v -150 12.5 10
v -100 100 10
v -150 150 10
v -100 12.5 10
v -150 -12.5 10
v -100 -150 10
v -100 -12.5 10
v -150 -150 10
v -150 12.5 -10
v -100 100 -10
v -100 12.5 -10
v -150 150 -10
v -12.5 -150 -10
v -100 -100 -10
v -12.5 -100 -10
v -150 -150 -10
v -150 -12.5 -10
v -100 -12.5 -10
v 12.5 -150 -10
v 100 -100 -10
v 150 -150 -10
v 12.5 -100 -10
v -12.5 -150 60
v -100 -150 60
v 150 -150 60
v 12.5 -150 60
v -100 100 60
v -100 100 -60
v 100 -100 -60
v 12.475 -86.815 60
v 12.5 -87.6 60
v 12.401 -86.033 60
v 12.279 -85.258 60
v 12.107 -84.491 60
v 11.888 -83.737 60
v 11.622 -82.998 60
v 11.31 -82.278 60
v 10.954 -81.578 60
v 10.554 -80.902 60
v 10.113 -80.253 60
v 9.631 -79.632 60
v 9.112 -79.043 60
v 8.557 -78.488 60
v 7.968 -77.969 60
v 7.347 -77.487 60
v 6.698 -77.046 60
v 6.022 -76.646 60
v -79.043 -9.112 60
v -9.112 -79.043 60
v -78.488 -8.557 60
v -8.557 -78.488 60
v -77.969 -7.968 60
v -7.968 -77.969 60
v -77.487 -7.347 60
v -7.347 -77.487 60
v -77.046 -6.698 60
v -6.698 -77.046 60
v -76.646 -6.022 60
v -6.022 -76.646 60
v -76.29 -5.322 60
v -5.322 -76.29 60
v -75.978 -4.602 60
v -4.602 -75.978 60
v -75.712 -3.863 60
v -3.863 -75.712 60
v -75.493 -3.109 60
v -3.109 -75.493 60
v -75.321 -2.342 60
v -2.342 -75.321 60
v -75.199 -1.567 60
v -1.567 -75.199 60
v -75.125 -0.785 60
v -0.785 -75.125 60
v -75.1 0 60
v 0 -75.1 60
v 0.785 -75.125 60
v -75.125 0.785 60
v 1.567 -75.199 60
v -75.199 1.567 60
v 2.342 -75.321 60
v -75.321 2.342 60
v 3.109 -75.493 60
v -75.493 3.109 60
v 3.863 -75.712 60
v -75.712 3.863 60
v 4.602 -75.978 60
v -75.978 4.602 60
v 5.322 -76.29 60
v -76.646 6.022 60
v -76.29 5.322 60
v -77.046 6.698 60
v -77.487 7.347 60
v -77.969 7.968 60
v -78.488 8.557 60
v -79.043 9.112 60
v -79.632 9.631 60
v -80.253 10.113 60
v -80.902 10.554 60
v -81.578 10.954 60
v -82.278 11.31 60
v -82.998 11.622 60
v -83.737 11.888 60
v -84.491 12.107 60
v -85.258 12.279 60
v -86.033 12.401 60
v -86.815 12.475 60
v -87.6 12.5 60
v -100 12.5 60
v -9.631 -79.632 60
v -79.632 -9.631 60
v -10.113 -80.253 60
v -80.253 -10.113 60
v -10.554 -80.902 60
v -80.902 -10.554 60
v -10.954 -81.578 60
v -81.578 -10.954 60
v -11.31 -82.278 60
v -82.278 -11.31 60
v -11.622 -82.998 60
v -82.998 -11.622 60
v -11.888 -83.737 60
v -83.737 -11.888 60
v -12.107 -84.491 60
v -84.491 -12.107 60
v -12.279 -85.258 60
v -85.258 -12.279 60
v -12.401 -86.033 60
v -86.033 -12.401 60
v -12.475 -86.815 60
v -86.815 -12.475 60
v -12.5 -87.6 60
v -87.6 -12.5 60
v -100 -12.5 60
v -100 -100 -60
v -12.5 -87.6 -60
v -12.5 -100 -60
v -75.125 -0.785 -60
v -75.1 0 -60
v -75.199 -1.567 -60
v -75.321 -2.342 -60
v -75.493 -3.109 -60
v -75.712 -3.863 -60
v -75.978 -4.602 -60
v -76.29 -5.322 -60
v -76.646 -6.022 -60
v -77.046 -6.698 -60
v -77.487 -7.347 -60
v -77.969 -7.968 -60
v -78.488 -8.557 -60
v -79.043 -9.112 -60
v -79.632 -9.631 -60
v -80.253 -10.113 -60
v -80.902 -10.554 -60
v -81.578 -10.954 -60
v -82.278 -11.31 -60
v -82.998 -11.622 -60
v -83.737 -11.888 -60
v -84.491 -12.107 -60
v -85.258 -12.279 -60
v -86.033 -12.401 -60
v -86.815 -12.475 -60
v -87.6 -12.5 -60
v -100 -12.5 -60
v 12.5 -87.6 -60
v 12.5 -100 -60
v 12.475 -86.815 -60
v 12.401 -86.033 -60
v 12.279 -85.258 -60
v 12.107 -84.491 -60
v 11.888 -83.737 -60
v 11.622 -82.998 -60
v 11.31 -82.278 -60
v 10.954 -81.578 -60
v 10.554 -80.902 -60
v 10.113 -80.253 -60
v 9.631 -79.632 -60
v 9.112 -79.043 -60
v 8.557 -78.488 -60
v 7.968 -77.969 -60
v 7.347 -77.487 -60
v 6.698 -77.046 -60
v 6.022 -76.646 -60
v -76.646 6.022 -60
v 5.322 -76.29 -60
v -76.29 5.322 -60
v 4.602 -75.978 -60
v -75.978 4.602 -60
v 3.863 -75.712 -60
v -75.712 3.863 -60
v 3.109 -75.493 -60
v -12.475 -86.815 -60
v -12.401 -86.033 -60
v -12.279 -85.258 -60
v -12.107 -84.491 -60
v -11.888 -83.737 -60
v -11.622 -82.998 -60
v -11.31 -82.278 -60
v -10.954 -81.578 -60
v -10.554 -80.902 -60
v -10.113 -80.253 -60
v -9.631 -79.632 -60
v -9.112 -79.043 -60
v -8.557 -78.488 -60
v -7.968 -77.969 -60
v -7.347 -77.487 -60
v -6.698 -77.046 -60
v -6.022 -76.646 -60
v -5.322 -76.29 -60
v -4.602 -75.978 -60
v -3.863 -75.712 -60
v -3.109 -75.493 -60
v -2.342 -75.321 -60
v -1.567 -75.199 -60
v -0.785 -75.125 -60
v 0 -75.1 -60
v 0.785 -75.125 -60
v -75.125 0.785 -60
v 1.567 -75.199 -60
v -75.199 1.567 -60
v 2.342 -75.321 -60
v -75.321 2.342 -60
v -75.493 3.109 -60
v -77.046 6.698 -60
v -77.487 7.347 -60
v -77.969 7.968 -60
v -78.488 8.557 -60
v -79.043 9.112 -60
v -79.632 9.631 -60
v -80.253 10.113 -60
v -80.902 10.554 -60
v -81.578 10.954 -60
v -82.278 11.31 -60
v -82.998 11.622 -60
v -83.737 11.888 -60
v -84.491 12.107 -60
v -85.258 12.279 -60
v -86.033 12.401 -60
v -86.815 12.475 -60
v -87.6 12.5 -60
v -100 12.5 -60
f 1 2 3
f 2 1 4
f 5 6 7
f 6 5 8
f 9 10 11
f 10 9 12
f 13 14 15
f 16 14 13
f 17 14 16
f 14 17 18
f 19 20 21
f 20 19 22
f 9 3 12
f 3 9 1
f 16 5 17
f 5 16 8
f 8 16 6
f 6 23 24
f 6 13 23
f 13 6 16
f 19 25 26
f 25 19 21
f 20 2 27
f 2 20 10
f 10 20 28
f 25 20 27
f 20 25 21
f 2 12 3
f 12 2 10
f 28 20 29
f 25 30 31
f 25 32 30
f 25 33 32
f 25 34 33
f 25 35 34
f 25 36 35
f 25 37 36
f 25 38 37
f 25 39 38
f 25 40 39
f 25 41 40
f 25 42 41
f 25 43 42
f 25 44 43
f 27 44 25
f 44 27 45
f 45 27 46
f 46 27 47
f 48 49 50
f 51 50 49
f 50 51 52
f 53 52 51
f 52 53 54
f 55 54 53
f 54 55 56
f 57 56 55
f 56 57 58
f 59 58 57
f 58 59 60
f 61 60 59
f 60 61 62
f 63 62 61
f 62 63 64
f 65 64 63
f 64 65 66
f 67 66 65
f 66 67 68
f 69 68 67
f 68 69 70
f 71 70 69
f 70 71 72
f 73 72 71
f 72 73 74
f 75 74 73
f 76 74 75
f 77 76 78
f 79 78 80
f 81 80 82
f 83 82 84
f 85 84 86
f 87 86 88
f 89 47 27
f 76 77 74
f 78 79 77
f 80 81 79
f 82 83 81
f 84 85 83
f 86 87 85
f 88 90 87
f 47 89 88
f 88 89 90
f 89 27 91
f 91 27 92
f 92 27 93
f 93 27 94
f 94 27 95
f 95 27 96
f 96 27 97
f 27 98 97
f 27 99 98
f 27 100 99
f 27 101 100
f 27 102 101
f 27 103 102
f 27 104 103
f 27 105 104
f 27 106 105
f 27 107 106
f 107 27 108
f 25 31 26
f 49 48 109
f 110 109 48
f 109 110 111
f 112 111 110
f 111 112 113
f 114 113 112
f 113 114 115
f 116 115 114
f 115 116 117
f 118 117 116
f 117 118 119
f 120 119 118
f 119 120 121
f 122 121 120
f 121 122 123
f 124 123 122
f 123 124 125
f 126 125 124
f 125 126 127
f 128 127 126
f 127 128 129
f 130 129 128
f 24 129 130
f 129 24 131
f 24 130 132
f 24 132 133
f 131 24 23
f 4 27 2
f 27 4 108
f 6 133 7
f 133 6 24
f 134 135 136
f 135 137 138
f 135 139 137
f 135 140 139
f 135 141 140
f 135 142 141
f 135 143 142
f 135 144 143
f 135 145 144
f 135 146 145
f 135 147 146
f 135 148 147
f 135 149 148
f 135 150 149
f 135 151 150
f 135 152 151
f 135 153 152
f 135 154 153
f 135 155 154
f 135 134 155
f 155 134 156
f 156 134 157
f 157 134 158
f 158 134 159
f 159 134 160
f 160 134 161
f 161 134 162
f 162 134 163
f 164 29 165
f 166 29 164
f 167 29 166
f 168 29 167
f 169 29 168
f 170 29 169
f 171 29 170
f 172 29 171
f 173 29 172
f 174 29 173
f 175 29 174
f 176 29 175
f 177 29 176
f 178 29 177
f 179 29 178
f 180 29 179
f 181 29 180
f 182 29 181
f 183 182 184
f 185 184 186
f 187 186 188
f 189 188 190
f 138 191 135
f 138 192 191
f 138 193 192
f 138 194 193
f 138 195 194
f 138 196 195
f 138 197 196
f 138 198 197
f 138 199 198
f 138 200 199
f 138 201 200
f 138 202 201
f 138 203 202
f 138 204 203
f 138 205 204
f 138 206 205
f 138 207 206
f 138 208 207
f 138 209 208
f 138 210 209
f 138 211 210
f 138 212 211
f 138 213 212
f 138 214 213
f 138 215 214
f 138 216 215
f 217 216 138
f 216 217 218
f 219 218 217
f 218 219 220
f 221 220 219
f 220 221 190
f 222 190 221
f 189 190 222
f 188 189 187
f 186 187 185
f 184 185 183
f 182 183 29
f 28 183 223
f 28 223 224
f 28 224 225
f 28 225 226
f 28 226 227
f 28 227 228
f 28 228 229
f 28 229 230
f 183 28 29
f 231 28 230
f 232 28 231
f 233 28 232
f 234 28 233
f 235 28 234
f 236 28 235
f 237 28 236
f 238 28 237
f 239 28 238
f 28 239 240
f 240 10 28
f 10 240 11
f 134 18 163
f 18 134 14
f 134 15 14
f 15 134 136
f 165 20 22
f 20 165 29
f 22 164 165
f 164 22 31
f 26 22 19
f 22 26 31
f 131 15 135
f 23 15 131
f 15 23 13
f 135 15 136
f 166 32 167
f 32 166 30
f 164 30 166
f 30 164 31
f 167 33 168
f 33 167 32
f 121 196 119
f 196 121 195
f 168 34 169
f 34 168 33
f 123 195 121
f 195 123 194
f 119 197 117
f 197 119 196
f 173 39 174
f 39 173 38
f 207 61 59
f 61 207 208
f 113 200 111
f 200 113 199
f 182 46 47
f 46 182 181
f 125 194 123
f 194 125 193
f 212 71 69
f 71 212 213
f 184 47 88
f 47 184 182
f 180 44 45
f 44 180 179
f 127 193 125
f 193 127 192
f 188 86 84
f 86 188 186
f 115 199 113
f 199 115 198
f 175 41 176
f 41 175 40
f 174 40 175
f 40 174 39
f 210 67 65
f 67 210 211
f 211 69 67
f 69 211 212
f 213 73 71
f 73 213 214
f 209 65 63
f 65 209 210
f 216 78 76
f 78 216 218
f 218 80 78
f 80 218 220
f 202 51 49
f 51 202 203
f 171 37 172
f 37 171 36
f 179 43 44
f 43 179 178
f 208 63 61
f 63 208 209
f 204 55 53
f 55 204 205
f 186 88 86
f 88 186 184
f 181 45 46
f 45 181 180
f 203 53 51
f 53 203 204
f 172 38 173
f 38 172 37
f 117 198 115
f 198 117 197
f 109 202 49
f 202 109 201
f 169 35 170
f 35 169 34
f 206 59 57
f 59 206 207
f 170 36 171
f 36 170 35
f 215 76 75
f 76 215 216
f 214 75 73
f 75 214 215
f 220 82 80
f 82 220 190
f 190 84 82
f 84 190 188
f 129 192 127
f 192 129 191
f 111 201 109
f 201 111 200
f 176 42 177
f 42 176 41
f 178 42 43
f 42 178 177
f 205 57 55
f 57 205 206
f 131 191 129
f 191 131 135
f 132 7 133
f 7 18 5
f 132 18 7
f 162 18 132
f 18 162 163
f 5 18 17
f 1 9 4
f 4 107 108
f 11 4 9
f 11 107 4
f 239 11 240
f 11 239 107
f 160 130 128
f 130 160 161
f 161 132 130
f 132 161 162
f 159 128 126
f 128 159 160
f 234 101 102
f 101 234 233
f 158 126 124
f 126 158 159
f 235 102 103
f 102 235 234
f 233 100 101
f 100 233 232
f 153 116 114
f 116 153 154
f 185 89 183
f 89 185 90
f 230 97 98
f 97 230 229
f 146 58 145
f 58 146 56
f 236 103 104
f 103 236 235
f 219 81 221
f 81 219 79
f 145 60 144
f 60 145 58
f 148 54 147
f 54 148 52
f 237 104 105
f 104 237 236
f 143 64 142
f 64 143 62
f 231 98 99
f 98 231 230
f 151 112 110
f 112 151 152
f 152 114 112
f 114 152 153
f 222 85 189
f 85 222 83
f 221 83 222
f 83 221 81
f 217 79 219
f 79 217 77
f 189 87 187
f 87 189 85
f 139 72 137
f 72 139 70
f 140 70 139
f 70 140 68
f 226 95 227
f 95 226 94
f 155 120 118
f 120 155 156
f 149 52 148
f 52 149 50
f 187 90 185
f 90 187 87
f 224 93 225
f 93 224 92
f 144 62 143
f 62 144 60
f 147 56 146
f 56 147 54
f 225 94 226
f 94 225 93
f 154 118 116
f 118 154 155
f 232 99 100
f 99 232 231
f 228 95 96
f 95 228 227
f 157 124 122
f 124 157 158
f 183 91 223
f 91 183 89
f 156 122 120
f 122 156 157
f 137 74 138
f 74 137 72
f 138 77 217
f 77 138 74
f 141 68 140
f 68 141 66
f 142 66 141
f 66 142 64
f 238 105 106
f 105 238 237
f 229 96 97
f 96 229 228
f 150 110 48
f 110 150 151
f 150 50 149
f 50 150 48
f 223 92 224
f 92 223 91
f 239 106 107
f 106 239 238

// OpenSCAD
do_all_parts=true;
do_part_1 = false ;
do_part_1_1 = false ;
do_part_1_2 = false ;
do_part_2 = false ;
do_part_2_1 = false ;
do_part_2_2 = false ;
do_part_3 = false ;
do_part_3_1 = false ;
do_part_3_2 = false ;

/* [Hidden] */
$fn = 100 ;

part_1_x = 300 ;
part_1_y = 300 ;
part_1_z = 20 ;
pos_part_1_mark = 150 ;
part_1_mark_size = 75 ;
part_1_mark_width = 25 ;
part_1_h = sqrt(part_1_x*part_1_x + part_1_y*part_1_y);

size_of_mark = part_1_mark_size-part_1_mark_width/2;

part_2_x = 250 ;
part_2_y = 250 ;
part_2_z = 50 ;
part_2_h = sqrt(part_2_x*part_2_x + part_2_y*part_2_y);

part_3_x = 200 ;
part_3_y = 200 ;
part_3_z = 50 ;
part_3_h = sqrt(part_3_x*part_3_x + part_3_y*part_3_y);

joint_x = 20 ;
joint_y = 10 ;
joint_z = 10 ;

module point() {
    color("red") { 
        sphere(1); 
    }
}

module encoche_part_1(h) {
    union() {
        cube([part_1_mark_width,size_of_mark,h+2],center=true);
        translate([0,part_1_mark_size/2-part_1_mark_width/4,0]) {
            cylinder(h=h+2,d=part_1_mark_width,center=true);
        }
    }
}

module part_1() {
    difference() {
        cube([part_1_x,part_1_y,part_1_z],center=true);

        translate([part_1_h/2,part_1_h/2,0]) {
            rotate([0,0,45]) {
                cube([2*part_1_x,2*part_1_y,2*part_1_z],center=true);
            }
        }
    }
}

module part_2() {
    difference() {
        cube([part_2_x,part_2_y,part_2_z],center=true);

        translate([part_2_h/2,part_2_h/2,0]) {
            rotate([0,0,45]) {
                cube([2*part_2_x,2*part_2_y,2*part_2_z],center=true);
            }
        }
    }
}

module part_3() {
    difference() {
        cube([part_3_x,part_3_y,part_3_z],center=true);

        translate([part_3_h/2,part_3_h/2,0]) {
            rotate([0,0,45]) {
                cube([2*part_3_x,2*part_3_y,2*part_3_z],center=true);
            }
        }
    }
}

if ( do_all_parts == true ) {
    difference() {
        union() {
            part_1();
            translate([(part_1_x-part_2_x)/2,-(part_1_y-part_2_y)/2,part_2_z/2+part_1_z/2]) {
                part_2();
            }
            translate([0,0,-(part_3_z/2+part_1_z/2)]) {
                part_3();
            }
        }
        mark_z = part_1_z + part_2_z + part_3_z ;
        translate([-part_1_x/2,-part_1_y/2,0]) {
            translate([part_1_x-pos_part_1_mark,size_of_mark/2-0.1,0]) {
                encoche_part_1(mark_z);
            }
        }    
        translate([-part_1_x/2,-part_1_y/2,0]) {
            translate([0,part_1_x-pos_part_1_mark,0]) {
                rotate([0,0,-90]) {
                    translate([0,size_of_mark/2-0.1,0]){
                        encoche_part_1(mark_z);
                    }
                }
            }
        }
    }
}

if ( do_part_1 == true ) {
    difference() {
        union() {
            part_1();
        }
        mark_z = part_1_z + part_2_z + part_3_z ;
        translate([-part_1_x/2,-part_1_y/2,0]) {
            translate([part_1_x-pos_part_1_mark,size_of_mark/2-0.1,0]) {
                encoche_part_1(mark_z);
            }
        }    
        translate([-part_1_x/2,-part_1_y/2,0]) {
            translate([0,part_1_x-pos_part_1_mark,0]) {
                rotate([0,0,-90]) {
                    translate([0,size_of_mark/2-0.1,0]){
                        encoche_part_1(mark_z);
                    }
                }
            }
        }
    }
}

if ( do_part_1_1 == true ) {
    difference() {
        difference() {
            difference() {
                union() {
                    part_1();
                }
                mark_z = part_1_z + part_2_z + part_3_z ;
                translate([-part_1_x/2,-part_1_y/2,0]) {
                    translate([part_1_x-pos_part_1_mark,size_of_mark/2-0.1,0]) {
                        encoche_part_1(mark_z);
                    }
                }    
                translate([-part_1_x/2,-part_1_y/2,0]) {
                    translate([0,part_1_x-pos_part_1_mark,0]) {
                        rotate([0,0,-90]) {
                            translate([0,size_of_mark/2-0.1,0]){
                                encoche_part_1(mark_z);
                            }
                        }
                    }
                }
            }
            rotate([0,0,-45]) {
                translate([part_1_x/2+0.1,-part_1_y/2+0.1,0,]) {
                    cube([part_1_x, part_1_y, 2*part_1_z],center=true);
                }
            }
        }
        translate([-part_1_x/4,-part_1_y/4,0]) {
            rotate([0,0,45]) {
                cube([joint_x, joint_y,joint_z],center=true);
            }
        }
    }
}

if ( do_part_1_2 == true ) {
    difference(){
        intersection() {
            difference() {
                union() {
                    part_1();
                }
                mark_z = part_1_z + part_2_z + part_3_z ;
                translate([-part_1_x/2,-part_1_y/2,0]) {
                    translate([part_1_x-pos_part_1_mark,size_of_mark/2-0.1,0]) {
                        encoche_part_1(mark_z);
                    }
                }    
                translate([-part_1_x/2,-part_1_y/2,0]) {
                    translate([0,part_1_x-pos_part_1_mark,0]) {
                        rotate([0,0,-90]) {
                            translate([0,size_of_mark/2-0.1,0]){
                                encoche_part_1(mark_z);
                            }
                        }
                    }
                }
            }
            rotate([0,0,-45]) {
                translate([part_1_x/2+0.1,-part_1_y/2+0.1,0,]) {
                    cube([part_1_x, part_1_y, 2*part_1_z],center=true);
                }
            }
        }
        translate([-part_1_x/4,-part_1_y/4,0]) {
            rotate([0,0,45]) {
                cube([joint_x, joint_y,joint_z],center=true);
            }
        }
    }
}

if ( do_part_2 == true ) {
    difference() {
        union() {
            translate([(part_1_x-part_2_x)/2,-(part_1_y-part_2_y)/2,part_2_z/2+part_1_z/2]) {
                part_2();
            }
        }
        mark_z = part_1_z + part_2_z + part_3_z ;
        translate([-part_1_x/2,-part_1_y/2,0]) {
            translate([part_1_x-pos_part_1_mark,size_of_mark/2-0.1,0]) {
                encoche_part_1(mark_z);
            }
        }    
        translate([-part_1_x/2,-part_1_y/2,0]) {
            translate([0,part_1_x-pos_part_1_mark,0]) {
                rotate([0,0,-90]) {
                    translate([0,size_of_mark/2-0.1,0]){
                        encoche_part_1(mark_z);
                    }
                }
            }
        }
    }
}

if ( do_part_2_1 == true ) {
    difference() {
        difference() {
            difference() {
                union() {
                    translate([(part_1_x-part_2_x)/2,-(part_1_y-part_2_y)/2,part_2_z/2+part_1_z/2]) {
                        part_2();
                    }
                }
                mark_z = part_1_z + part_2_z + part_3_z ;
                translate([-part_1_x/2,-part_1_y/2,0]) {
                    translate([part_1_x-pos_part_1_mark,size_of_mark/2-0.1,0]) {
                        encoche_part_1(mark_z);
                    }
                }    
                translate([-part_1_x/2,-part_1_y/2,0]) {
                    translate([0,part_1_x-pos_part_1_mark,0]) {
                        rotate([0,0,-90]) {
                            translate([0,size_of_mark/2-0.1,0]){
                                encoche_part_1(mark_z);
                            }
                        }
                    }
                }
            }
            rotate([0,0,-45]) {
                translate([part_2_x/2+35+0.1,-part_2_y/2+0.1,part_2_z]) {
                    cube([part_2_x, part_2_y, 2*part_2_z],center=true);
                }
            }
        }
        translate([(part_1_x-part_2_x)/2,-(part_1_y-part_2_y)/2,part_2_z/2+part_1_z/2]) {
            translate([-part_2_x/4,-part_2_y/4,0]) {
                rotate([0,0,45]) {
                    cube([joint_x, joint_y,joint_z],center=true);
                }
            }
        }
    }
}

if ( do_part_2_2 == true ) {
    difference() {
        intersection() {
            difference() {
                union() {
                    translate([(part_1_x-part_2_x)/2,-(part_1_y-part_2_y)/2,part_2_z/2+part_1_z/2]) {
                        part_2();
                    }
                }
                mark_z = part_1_z + part_2_z + part_3_z ;
                translate([-part_1_x/2,-part_1_y/2,0]) {
                    translate([part_1_x-pos_part_1_mark,size_of_mark/2-0.1,0]) {
                        encoche_part_1(mark_z);
                    }
                }    
                translate([-part_1_x/2,-part_1_y/2,0]) {
                    translate([0,part_1_x-pos_part_1_mark,0]) {
                        rotate([0,0,-90]) {
                            translate([0,size_of_mark/2-0.1,0]){
                                encoche_part_1(mark_z);
                            }
                        }
                    }
                }
            }
            rotate([0,0,-45]) {
                translate([part_2_x/2+35+0.1,-part_2_y/2+0.1,part_2_z]) {
                    cube([part_2_x, part_2_y, 2*part_2_z],center=true);
                }
            }
        }
        translate([(part_1_x-part_2_x)/2,-(part_1_y-part_2_y)/2,part_2_z/2+part_1_z/2]) {
            translate([-part_2_x/4,-part_2_y/4,0]) {
                rotate([0,0,45]) {
                    cube([joint_x, joint_y,joint_z],center=true);
                }
            }
        }
    }
}

if ( do_part_3 == true ) {
    difference() {
        union() {
            translate([0,0,-(part_3_z/2+part_1_z/2)]) {
                part_3();
            }
        }
        mark_z = part_1_z + part_2_z + part_3_z ;
        translate([-part_1_x/2,-part_1_y/2,0]) {
            translate([part_1_x-pos_part_1_mark,size_of_mark/2-0.1,0]) {
                encoche_part_1(mark_z);
            }
        }    
        translate([-part_1_x/2,-part_1_y/2,0]) {
            translate([0,part_1_x-pos_part_1_mark,0]) {
                rotate([0,0,-90]) {
                    translate([0,size_of_mark/2-0.1,0]){
                        encoche_part_1(mark_z);
                    }
                }
            }
        }
    }
}

if ( do_part_3_1 == true ) {
    difference() {
        difference() {
            difference() {
                union() {
                    translate([0,0,-(part_3_z/2+part_1_z/2)]) {
                        part_3();
                    }
                }
                mark_z = part_1_z + part_2_z + part_3_z ;
                translate([-part_1_x/2,-part_1_y/2,0]) {
                    translate([part_1_x-pos_part_1_mark,size_of_mark/2-0.1,0]) {
                        encoche_part_1(mark_z);
                    }
                }    
                translate([-part_1_x/2,-part_1_y/2,0]) {
                    translate([0,part_1_x-pos_part_1_mark,0]) {
                        rotate([0,0,-90]) {
                            translate([0,size_of_mark/2-0.1,0]){
                                encoche_part_1(mark_z);
                            }
                        }
                    }
                }
            }
            rotate([0,0,-45]) {
                translate([part_3_x/2+0.1,-part_3_y/2+0.1,-part_3_z]) {
                    cube([part_3_x, part_3_y, 2*part_3_z],center=true);
                }
            }
        }    
        translate([-part_3_x/4,-part_3_y/4,-(part_3_z/2+part_1_z/2)]) {
            rotate([0,0,45]) {
                cube([joint_x, joint_y,joint_z],center=true);
            }
        }
    }
}

if ( do_part_3_2 == true ) {
    difference() {
        intersection() {
            difference() {
                union() {
                    translate([0,0,-(part_3_z/2+part_1_z/2)]) {
                        part_3();
                    }
                }
                mark_z = part_1_z + part_2_z + part_3_z ;
                translate([-part_1_x/2,-part_1_y/2,0]) {
                    translate([part_1_x-pos_part_1_mark,size_of_mark/2-0.1,0]) {
                        encoche_part_1(mark_z);
                    }
                }    
                translate([-part_1_x/2,-part_1_y/2,0]) {
                    translate([0,part_1_x-pos_part_1_mark,0]) {
                        rotate([0,0,-90]) {
                            translate([0,size_of_mark/2-0.1,0]){
                                encoche_part_1(mark_z);
                            }
                        }
                    }
                }
            }
            rotate([0,0,-45]) {
                translate([part_3_x/2+0.1,-part_3_y/2+0.1,-part_3_z]) {
                    cube([part_3_x, part_3_y, 2*part_3_z],center=true);
                }
            }
        }
        translate([-part_3_x/4,-part_3_y/4,-(part_3_z/2+part_1_z/2)]) {
            rotate([0,0,45]) {
                cube([joint_x, joint_y,joint_z],center=true);
            }
        }
    }
}
